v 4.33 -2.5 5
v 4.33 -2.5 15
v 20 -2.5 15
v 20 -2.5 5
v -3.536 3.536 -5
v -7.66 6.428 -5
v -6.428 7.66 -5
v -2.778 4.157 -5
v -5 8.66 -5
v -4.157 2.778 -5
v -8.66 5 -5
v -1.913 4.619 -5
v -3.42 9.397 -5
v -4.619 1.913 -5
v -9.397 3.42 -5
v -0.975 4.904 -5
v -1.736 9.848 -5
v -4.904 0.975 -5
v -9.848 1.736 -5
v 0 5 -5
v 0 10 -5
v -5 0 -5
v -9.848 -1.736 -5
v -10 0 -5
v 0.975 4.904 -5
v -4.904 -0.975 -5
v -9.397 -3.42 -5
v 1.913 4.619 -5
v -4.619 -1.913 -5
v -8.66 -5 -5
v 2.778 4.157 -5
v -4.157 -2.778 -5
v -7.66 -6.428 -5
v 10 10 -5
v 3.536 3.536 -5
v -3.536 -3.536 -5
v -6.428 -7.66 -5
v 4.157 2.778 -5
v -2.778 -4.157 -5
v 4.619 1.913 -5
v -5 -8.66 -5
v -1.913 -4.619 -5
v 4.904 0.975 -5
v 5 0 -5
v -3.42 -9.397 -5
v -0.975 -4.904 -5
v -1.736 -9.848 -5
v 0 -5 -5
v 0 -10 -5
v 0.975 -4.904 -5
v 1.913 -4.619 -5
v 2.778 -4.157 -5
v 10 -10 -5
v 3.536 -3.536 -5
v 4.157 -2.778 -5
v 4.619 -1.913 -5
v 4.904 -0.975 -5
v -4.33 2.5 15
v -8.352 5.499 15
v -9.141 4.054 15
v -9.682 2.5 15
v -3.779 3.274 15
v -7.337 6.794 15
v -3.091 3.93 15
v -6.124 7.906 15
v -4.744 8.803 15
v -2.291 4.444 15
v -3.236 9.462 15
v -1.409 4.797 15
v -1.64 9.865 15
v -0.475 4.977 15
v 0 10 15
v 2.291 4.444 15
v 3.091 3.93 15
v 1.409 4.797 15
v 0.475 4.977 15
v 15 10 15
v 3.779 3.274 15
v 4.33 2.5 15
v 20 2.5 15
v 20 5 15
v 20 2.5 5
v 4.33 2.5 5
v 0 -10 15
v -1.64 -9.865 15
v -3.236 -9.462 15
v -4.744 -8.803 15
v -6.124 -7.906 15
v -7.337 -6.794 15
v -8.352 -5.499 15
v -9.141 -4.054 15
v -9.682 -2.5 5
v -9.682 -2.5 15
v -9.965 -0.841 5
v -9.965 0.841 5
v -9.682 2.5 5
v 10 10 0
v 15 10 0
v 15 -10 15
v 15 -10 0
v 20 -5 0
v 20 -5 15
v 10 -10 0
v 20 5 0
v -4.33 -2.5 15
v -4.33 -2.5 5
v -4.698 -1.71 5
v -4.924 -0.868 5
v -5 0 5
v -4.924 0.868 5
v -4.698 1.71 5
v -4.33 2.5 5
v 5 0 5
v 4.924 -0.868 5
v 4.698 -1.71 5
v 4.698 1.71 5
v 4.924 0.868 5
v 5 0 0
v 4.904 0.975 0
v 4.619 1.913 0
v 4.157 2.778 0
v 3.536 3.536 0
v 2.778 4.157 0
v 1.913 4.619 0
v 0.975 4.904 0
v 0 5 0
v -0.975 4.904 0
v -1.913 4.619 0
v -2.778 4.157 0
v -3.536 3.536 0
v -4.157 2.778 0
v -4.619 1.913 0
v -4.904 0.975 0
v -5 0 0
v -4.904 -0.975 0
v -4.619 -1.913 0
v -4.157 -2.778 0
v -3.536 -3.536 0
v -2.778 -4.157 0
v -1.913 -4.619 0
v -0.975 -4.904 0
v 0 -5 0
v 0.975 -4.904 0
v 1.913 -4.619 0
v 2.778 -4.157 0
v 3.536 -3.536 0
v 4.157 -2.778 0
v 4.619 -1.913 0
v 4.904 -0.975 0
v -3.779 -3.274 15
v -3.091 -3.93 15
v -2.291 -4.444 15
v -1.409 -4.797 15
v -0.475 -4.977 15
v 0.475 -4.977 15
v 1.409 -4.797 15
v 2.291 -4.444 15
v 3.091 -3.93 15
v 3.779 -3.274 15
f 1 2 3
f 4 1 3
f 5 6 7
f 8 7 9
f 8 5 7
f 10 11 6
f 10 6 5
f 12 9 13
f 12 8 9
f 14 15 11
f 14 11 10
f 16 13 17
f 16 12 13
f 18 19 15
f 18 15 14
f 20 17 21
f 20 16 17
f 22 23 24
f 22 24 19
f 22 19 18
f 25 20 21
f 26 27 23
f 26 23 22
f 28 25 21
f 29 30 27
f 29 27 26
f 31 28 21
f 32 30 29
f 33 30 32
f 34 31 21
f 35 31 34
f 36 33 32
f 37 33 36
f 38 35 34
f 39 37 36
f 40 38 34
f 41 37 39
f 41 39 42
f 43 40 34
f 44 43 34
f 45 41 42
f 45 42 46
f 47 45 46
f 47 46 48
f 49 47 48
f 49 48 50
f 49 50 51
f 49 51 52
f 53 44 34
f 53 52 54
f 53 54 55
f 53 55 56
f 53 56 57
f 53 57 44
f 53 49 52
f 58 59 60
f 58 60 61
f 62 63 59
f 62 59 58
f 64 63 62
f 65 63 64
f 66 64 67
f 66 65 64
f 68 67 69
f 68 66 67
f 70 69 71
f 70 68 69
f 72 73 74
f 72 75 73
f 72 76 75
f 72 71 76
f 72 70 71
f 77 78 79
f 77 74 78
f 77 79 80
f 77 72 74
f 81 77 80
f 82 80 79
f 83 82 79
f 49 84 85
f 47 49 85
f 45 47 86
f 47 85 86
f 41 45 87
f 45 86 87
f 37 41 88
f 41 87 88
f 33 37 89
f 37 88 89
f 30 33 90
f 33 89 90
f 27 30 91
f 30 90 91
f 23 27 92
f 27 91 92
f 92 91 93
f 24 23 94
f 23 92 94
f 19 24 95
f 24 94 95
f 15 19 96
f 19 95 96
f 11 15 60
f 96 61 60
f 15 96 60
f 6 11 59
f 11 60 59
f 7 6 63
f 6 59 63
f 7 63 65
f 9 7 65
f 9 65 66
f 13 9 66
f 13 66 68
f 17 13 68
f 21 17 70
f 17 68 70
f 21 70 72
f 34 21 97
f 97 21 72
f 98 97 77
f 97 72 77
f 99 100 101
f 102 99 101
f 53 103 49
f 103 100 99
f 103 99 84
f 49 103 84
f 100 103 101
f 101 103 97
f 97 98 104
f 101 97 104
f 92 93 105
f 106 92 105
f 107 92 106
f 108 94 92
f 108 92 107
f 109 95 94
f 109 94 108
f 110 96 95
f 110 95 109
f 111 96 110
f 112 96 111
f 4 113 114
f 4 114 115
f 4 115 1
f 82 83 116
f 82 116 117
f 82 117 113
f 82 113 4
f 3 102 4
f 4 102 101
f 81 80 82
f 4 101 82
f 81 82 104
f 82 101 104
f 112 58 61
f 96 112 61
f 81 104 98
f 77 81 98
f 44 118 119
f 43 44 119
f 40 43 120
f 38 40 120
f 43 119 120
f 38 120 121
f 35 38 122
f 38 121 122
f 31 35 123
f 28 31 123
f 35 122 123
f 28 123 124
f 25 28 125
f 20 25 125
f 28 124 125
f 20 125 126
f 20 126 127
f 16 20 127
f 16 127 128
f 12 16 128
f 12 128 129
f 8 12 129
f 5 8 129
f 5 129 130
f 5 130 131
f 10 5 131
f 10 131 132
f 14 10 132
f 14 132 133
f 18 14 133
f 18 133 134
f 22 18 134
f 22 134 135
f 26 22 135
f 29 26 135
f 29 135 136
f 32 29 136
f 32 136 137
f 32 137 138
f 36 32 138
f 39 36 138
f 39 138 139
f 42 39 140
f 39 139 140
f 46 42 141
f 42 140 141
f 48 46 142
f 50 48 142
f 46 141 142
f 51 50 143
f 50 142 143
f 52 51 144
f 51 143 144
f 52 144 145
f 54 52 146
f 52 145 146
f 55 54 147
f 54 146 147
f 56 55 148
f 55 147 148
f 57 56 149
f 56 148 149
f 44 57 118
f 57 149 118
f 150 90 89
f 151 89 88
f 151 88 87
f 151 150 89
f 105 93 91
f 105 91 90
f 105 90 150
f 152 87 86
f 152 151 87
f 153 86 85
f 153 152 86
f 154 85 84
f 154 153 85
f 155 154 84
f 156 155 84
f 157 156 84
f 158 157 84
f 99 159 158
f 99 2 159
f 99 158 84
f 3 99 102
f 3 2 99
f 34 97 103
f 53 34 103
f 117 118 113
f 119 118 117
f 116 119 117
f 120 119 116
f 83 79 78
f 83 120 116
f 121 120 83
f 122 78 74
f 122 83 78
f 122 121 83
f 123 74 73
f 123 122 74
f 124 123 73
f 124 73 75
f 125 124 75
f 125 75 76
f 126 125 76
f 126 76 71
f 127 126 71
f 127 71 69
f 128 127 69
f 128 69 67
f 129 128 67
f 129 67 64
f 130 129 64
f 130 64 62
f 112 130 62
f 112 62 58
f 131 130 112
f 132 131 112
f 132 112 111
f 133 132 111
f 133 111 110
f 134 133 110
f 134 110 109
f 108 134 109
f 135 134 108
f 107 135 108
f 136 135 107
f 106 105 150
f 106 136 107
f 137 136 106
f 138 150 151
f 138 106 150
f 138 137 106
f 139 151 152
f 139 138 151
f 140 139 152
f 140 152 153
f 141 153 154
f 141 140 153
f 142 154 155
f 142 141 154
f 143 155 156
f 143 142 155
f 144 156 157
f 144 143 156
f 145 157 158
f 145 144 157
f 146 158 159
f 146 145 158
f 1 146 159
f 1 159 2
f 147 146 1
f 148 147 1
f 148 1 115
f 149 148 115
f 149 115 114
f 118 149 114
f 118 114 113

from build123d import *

# Parameters (mm, degrees)
F0_R     = 5
F1_DEPTH = 15
F3_DEPTH = 5
F4_DEPTH = 25
F6_DEPTH = 10


with BuildPart() as f1:
    # F0 (on Top) → F1 (new body)
    with BuildSketch(Plane.XY):
        with BuildLine():
            ThreePointArc((0, -10), (7.0710678119, -7.0710678119), (10, 0))
            ThreePointArc((10, 0), (7.0710678119, 7.0710678119), (0, 10))
            ThreePointArc((0, 10), (-10, 0), (0, -10))
        make_face()
        Circle(F0_R, mode=Mode.SUBTRACT)
        with BuildLine():
            ThreePointArc((0, 10), (7.0710678119, 7.0710678119), (10, 0))
            ThreePointArc((10, 0), (7.0710678119, -7.0710678119), (0, -10))
            Line((0, -10), (15, -10))
            Line((15, -10), (20, -5))
            Line((20, -5), (20, 5))
            Line((20, 5), (15, 10))
            Line((15, 10), (0, 10))
        make_face()
    extrude(amount=F1_DEPTH)

    # F2 (on face) → F3 (join)
    with BuildSketch(Plane(origin=(0, 0, 0), x_dir=(1, 0, 0), z_dir=(0, 0, -1))):
        with BuildLine():
            ThreePointArc((0, 10), (-10, 0), (0, -10))
            Line((0, -10), (10, -10))
            Line((10, -10), (10, 10))
            Line((10, 10), (0, 10))
        make_face()
    extrude(amount=F3_DEPTH)

    # F4 (cut): a face of the model
    f4_faces = [f1.faces().sort_by_distance(p)[0] for p in [
        (0, 0, 0),
    ]]
    extrude(f4_faces, amount=-F4_DEPTH, mode=Mode.SUBTRACT)

    # F5 (on face) → F6 (cut)
    with BuildSketch(Plane.XY.offset(15)):
        with BuildLine():
            ThreePointArc((-9.6824583655, 2.5), (-10, 0), (-9.6824583655, -2.5))
            Line((-9.6824583655, -2.5), (20, -2.5))
            Line((20, -2.5), (20, 2.5))
            Line((20, 2.5), (-9.6824583655, 2.5))
        make_face()
    extrude(amount=-F6_DEPTH, mode=Mode.SUBTRACT)


solid = f1.part
